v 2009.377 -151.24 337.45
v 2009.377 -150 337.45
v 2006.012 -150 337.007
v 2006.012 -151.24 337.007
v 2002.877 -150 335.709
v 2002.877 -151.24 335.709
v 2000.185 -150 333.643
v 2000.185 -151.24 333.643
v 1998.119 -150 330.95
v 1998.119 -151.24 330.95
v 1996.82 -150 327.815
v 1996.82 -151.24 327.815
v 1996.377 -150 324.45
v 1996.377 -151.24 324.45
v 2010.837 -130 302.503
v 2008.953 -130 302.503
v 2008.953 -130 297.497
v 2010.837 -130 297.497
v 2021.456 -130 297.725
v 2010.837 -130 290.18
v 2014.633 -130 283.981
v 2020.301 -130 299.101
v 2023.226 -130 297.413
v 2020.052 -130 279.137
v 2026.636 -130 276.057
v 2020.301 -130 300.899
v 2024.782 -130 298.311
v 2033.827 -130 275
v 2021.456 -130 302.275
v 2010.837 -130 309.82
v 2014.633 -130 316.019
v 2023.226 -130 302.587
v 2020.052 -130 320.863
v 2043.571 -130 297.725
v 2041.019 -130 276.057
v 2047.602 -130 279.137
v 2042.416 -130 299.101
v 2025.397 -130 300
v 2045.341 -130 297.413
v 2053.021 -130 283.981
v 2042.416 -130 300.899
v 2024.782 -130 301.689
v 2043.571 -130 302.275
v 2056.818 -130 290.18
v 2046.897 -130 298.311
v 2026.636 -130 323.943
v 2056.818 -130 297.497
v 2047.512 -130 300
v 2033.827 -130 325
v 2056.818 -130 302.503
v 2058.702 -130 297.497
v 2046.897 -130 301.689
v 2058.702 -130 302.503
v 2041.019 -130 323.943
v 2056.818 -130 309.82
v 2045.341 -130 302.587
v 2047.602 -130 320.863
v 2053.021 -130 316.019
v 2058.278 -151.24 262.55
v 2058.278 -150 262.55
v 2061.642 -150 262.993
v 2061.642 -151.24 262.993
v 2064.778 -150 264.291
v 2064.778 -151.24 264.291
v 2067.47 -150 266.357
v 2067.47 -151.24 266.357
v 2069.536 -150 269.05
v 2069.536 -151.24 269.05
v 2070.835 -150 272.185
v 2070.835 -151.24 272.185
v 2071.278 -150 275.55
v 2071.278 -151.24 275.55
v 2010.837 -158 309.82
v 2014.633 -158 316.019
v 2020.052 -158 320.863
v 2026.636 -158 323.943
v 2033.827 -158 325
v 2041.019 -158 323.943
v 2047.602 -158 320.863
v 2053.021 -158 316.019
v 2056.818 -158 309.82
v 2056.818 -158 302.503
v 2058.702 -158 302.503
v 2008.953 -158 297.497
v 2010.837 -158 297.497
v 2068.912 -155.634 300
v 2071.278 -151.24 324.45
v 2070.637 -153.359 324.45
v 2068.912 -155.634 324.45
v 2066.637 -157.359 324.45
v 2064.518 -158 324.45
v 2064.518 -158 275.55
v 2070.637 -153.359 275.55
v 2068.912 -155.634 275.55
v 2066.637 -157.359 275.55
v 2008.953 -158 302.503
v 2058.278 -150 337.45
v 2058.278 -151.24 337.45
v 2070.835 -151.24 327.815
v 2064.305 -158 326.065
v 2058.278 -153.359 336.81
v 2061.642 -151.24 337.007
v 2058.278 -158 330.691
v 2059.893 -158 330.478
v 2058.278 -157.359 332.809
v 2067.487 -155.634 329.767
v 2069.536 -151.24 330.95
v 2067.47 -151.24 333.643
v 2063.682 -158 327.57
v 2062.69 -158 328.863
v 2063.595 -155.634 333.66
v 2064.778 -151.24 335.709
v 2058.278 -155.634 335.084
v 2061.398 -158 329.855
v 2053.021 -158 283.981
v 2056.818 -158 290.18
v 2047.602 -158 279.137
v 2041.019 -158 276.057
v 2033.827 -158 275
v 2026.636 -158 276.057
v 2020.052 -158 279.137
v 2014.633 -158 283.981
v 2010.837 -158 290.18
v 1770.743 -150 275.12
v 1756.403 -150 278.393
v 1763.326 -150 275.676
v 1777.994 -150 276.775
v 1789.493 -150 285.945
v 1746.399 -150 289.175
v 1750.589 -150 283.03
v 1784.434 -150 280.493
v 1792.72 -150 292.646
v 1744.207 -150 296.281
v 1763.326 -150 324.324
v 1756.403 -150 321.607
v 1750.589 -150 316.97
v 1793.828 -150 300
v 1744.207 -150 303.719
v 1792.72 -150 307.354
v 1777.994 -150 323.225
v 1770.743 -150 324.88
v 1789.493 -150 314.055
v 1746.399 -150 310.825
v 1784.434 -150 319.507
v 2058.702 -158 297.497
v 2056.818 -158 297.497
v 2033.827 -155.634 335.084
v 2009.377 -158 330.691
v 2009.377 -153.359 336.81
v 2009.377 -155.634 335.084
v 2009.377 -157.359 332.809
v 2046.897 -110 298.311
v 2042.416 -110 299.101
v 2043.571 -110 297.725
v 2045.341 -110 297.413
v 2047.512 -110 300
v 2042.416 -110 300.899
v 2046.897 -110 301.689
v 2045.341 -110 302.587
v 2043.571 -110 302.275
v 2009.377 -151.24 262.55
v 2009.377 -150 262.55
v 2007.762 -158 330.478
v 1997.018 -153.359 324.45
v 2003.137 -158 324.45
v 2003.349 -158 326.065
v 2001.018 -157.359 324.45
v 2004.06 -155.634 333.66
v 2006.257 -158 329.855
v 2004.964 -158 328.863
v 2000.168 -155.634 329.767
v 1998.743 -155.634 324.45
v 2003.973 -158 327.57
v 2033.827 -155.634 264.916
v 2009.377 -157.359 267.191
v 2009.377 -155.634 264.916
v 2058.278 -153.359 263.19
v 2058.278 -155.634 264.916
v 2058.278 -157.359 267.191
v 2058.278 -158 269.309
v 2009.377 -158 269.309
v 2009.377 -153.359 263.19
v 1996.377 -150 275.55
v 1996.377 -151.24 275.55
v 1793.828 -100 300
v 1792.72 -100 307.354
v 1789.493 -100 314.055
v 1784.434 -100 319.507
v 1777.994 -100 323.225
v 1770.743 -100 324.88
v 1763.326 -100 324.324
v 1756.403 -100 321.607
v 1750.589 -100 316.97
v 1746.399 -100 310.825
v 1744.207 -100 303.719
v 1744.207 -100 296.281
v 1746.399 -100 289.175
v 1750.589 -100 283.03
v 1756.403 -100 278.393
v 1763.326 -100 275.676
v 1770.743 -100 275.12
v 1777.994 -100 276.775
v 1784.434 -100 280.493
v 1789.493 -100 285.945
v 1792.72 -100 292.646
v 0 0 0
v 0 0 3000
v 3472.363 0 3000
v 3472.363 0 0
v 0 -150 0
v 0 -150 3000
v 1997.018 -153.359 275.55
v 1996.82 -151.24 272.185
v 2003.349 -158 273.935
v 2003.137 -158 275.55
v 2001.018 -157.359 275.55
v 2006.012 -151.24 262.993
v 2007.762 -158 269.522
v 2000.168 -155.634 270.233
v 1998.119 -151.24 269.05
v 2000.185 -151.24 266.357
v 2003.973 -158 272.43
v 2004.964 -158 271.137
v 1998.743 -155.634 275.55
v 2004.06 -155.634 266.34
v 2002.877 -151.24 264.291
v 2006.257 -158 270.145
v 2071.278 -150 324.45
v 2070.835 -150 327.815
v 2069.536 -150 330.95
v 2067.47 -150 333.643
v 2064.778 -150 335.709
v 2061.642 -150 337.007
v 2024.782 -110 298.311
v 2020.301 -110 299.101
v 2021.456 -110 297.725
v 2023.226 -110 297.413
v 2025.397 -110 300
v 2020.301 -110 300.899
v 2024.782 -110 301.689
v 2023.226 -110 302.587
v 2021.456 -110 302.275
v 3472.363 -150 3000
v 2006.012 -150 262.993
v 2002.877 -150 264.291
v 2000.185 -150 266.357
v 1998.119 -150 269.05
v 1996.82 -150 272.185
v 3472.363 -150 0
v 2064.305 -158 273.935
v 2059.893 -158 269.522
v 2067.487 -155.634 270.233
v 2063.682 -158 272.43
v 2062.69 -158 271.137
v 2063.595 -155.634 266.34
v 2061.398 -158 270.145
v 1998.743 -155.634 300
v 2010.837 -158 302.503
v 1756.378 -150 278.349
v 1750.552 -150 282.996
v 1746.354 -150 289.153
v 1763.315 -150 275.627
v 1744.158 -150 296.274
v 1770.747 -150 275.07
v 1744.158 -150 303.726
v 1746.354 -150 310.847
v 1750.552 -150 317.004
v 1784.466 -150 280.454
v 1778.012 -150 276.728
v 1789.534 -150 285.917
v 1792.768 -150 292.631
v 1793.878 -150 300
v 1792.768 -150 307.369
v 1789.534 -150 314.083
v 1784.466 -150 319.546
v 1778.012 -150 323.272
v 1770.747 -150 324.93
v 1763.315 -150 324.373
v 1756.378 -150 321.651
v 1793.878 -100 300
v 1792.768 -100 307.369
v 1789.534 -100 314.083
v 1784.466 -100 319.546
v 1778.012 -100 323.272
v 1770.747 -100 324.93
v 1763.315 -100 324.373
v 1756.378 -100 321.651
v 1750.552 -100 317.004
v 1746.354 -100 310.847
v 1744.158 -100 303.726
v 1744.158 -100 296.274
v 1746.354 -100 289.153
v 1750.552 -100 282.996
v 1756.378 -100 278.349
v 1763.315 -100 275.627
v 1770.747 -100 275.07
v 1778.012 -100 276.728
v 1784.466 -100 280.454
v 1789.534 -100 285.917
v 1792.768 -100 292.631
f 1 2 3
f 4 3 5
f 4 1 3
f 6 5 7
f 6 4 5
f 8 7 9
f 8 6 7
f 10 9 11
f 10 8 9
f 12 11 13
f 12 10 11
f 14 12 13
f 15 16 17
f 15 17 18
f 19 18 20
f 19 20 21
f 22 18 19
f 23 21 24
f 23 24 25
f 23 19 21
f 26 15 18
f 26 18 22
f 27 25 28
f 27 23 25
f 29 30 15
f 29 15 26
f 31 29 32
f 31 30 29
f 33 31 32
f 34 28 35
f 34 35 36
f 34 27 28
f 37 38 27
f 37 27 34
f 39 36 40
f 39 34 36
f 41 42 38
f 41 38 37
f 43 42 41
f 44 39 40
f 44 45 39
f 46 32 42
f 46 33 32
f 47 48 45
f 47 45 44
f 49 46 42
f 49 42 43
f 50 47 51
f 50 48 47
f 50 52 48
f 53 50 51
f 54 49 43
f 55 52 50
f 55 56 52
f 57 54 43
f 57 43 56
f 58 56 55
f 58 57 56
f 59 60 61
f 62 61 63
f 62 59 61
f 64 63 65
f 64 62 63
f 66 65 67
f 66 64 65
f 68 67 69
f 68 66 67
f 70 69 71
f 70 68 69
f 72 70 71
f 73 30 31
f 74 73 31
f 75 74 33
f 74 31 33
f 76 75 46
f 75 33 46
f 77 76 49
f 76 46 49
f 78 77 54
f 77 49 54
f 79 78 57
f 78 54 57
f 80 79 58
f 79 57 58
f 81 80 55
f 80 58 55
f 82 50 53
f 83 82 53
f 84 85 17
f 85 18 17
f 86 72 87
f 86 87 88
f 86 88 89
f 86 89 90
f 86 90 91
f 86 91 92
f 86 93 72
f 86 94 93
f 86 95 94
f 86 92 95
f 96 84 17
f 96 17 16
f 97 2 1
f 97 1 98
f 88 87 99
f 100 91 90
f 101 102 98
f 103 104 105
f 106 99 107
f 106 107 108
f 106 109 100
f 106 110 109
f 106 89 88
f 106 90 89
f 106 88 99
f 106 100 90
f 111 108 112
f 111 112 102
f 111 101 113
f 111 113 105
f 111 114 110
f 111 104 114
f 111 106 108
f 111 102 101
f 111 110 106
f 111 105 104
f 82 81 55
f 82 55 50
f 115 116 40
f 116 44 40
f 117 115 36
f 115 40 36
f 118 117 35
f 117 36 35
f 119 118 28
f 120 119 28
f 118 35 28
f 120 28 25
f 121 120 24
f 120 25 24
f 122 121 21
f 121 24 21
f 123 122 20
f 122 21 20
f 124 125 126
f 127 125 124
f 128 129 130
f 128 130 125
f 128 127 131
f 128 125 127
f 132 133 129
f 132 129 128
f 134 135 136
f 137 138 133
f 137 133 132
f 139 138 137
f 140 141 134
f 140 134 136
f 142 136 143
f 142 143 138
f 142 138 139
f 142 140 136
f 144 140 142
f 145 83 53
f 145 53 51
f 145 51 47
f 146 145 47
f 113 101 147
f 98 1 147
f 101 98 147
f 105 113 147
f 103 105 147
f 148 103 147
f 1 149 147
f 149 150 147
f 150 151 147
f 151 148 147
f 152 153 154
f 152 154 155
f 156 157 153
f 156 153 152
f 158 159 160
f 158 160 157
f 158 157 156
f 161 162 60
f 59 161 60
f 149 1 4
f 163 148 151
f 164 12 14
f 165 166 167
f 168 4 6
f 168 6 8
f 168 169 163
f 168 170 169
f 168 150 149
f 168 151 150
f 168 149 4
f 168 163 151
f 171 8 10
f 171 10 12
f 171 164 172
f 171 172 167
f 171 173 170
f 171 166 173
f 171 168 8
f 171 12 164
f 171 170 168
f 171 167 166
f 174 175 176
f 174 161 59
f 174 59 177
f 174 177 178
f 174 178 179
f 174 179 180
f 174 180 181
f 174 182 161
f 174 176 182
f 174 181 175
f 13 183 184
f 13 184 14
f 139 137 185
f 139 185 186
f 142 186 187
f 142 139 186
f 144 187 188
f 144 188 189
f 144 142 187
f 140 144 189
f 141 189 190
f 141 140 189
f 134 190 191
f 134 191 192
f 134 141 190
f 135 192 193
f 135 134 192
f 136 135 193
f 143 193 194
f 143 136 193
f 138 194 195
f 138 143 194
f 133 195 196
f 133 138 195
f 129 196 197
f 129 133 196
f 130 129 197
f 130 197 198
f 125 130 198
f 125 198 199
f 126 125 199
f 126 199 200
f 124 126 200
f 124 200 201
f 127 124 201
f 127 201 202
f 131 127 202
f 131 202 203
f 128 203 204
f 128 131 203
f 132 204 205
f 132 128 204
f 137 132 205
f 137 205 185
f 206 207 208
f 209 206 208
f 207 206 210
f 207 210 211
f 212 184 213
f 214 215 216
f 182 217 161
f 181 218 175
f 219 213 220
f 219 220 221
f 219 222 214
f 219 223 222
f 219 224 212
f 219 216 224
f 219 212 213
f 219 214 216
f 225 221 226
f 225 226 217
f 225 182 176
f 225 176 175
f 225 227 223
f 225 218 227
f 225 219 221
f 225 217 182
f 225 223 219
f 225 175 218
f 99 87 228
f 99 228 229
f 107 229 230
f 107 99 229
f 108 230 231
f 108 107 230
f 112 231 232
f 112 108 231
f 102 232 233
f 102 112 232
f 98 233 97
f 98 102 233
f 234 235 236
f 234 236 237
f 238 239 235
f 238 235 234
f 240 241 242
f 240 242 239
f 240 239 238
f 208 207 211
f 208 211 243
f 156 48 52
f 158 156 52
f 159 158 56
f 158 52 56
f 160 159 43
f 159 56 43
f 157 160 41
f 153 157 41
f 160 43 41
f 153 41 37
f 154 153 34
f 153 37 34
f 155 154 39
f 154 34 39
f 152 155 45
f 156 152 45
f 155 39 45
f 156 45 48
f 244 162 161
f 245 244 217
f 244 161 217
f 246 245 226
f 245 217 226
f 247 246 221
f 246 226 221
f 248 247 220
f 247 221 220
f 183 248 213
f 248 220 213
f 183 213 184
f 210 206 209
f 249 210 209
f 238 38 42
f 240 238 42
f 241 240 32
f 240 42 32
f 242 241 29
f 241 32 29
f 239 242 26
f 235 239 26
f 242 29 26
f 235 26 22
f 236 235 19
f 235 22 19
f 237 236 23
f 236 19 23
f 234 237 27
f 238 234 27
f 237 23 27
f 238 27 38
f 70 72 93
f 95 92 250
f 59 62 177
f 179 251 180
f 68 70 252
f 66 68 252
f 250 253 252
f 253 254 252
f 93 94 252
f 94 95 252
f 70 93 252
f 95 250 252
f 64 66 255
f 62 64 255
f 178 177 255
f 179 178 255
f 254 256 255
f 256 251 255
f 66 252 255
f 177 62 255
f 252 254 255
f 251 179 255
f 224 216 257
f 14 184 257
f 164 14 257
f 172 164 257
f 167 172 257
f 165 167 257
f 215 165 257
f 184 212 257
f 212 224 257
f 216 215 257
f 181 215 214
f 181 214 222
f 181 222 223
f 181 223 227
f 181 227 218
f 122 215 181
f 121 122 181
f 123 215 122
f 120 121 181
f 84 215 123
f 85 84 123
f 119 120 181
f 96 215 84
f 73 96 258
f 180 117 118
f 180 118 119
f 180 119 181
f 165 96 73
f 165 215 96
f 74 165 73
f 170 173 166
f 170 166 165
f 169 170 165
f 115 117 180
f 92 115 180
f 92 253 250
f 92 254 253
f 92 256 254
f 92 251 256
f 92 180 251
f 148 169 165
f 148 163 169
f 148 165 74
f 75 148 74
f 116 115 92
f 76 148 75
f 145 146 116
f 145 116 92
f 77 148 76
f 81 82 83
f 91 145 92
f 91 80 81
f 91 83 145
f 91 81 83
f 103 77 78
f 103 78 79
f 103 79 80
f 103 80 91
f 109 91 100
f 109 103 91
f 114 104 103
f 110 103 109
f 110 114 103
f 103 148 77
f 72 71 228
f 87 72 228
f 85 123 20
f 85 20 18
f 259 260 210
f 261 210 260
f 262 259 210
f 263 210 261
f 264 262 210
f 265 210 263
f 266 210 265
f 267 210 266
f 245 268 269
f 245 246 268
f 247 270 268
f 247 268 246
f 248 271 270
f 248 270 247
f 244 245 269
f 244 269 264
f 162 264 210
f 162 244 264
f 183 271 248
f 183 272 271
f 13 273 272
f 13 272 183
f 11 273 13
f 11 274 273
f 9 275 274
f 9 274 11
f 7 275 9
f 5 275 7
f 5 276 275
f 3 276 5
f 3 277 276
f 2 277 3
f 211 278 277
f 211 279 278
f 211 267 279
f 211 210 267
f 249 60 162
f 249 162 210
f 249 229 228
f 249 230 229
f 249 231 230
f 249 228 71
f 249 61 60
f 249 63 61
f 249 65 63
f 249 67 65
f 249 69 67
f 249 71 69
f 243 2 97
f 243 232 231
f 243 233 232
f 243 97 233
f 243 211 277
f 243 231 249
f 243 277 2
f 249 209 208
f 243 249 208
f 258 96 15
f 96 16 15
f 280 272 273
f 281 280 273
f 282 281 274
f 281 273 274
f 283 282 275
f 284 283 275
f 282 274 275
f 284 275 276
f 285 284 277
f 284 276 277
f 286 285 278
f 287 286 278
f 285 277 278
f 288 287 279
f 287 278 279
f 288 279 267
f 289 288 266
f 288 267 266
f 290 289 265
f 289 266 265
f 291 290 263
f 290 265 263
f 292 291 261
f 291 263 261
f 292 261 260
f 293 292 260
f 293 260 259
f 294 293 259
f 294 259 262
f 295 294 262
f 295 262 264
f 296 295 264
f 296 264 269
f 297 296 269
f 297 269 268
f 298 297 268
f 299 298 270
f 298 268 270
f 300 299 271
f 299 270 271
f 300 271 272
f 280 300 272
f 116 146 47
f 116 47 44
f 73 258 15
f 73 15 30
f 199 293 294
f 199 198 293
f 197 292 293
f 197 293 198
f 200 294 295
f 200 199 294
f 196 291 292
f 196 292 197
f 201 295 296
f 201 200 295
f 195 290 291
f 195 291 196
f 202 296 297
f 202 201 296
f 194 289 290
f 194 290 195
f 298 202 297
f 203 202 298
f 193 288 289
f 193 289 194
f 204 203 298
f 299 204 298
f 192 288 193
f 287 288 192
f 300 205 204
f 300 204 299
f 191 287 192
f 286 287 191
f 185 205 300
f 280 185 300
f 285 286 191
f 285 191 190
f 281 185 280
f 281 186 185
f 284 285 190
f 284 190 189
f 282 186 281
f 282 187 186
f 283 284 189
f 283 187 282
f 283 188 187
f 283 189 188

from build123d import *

# Parameters (mm, degrees)
F0_W         = 3472.3631921678
F0_H         = 3000
F1_DEPTH     = 150
F2_R         = 25
F2_R_2       = 24.95
F3_DEPTH     = 50
F4_W         = 74.9007655587
F4_H         = 74.9007655587
F5_DEPTH     = 8
F6_R         = 13
F7_T1_DEPTH  = 48.9007655587
F7_T3_DEPTH  = 48.9007655587
F7_T6_ANGLE  = 90
F7_T8_ANGLE  = 90
F7_T10_ANGLE = 90
F7_T12_ANGLE = 90
F4_R         = 2.6271162968
F8_DEPTH     = 20
F9_DEPTH     = 40


# Not quite as in the source:
# - a fillet or chamfer that OpenCascade refuses, or shapes differently, is made with other operations: its cross-section is extruded or revolved along the edge and cut away or added


with BuildPart() as f1:
    # F0 (on Front) → F1 (new body)
    with BuildSketch(Plane.XZ):
        with Locations((1736.1815960839, 1500)):
            Rectangle(F0_W, F0_H)
    extrude(amount=F1_DEPTH)

    # F2 (on face) → F3 (cut)
    with BuildSketch(Plane.XZ.offset(150)):
        with Locations((1768.8783407211, 300)):
            Circle(F2_R)
        with Locations((1768.8783407211, 300)):
            Circle(F2_R_2, mode=Mode.SUBTRACT)
    extrude(amount=-F3_DEPTH, mode=Mode.SUBTRACT)

    # F4 (on face) → F5 (join)
    with BuildSketch(Plane.XZ.offset(150)):
        with Locations((2033.8273048401, 300)):
            Rectangle(F4_W, F4_H)
        with BuildLine():
            ThreePointArc((2056.8177885488, 290.179732242), (2033.8273048401, 275), (2010.8368211313, 290.179732242))
            Line((2010.8368211313, 290.179732242), (2010.8368211313, 297.4973082542))
            Line((2010.8368211313, 297.4973082542), (2008.9528895902, 297.4973082542))
            Line((2008.9528895902, 297.4973082542), (2008.9528895902, 302.5026917458))
            Line((2008.9528895902, 302.5026917458), (2010.8368211313, 302.5026917458))
            Line((2010.8368211313, 302.5026917458), (2010.8368211313, 309.820267758))
            ThreePointArc((2010.8368211313, 309.820267758), (2020.0524490141, 320.8627262594), (2033.8273048401, 325))
            ThreePointArc((2033.8273048401, 325), (2047.602160666, 320.8627262594), (2056.8177885488, 309.820267758))
            Line((2056.8177885488, 309.820267758), (2056.8177885488, 302.5026917458))
            Line((2056.8177885488, 302.5026917458), (2058.70172009, 302.5026917458))
            Line((2058.70172009, 302.5026917458), (2058.70172009, 297.4973082542))
            Line((2058.70172009, 297.4973082542), (2056.8177885488, 297.4973082542))
            Line((2056.8177885488, 297.4973082542), (2056.8177885488, 290.179732242))
        make_face(mode=Mode.SUBTRACT)
    extrude(amount=F5_DEPTH)

    # F6
    f6_edges = [f1.edges().sort_by_distance(p)[0] for p in [
        (1996.376922, -154, 337.450383),
        (1996.376922, -154, 262.549617),
        (2071.277688, -154, 262.549617),
        (2071.277688, -154, 337.450383),
    ]]
    fillet(f6_edges, radius=F6_R)

    # F7: fillet of radius 6.7597979746 on 8 edges, made by hand

    # F7_s2 → F7_t1 (cut)
    with BuildSketch(Plane.YZ.offset(2009.3769220608)):
        with BuildLine():
            add(Edge.make_bspline(
                [(-151.2402020254, 337.4503827793), (-158, 337.4503827793), (-158, 330.6905848047)],
                knots=[0, 0, 0, 1, 1, 1], degree=2, weights=[1, 0.4285714286, 1]))
            Line((-158, 330.6905848047), (-158, 337.4503827793))
            Line((-158, 337.4503827793), (-151.2402020254, 337.4503827793))
        make_face()
        with BuildLine():
            add(Edge.make_bspline(
                [(-151.2402020254, 262.5496172207), (-158, 262.5496172207), (-158, 269.3094151953)],
                knots=[0, 0, 0, 1, 1, 1], degree=2, weights=[1, 0.4285714286, 1]))
            Line((-158, 269.3094151953), (-158, 262.5496172207))
            Line((-158, 262.5496172207), (-151.2402020254, 262.5496172207))
        make_face()
    extrude(amount=F7_T1_DEPTH, mode=Mode.SUBTRACT)

    # F7_s4 → F7_t3 (cut)
    with BuildSketch(Plane.XY.offset(275.5496172207)):
        with BuildLine():
            add(Edge.make_bspline(
                [(2071.2776876194, -151.2402020254), (2071.2776876194, -158), (2064.5178896448, -158)],
                knots=[0, 0, 0, 1, 1, 1], degree=2, weights=[1, 0.4285714286, 1]))
            Line((2064.5178896448, -158), (2071.2776876194, -158))
            Line((2071.2776876194, -158), (2071.2776876194, -151.2402020254))
        make_face()
        with BuildLine():
            add(Edge.make_bspline(
                [(1996.3769220608, -151.2402020254), (1996.3769220608, -158), (2003.1367200354, -158)],
                knots=[0, 0, 0, 1, 1, 1], degree=2, weights=[1, 0.4285714286, 1]))
            Line((2003.1367200354, -158), (1996.3769220608, -158))
            Line((1996.3769220608, -158), (1996.3769220608, -151.2402020254))
        make_face()
    extrude(amount=F7_T3_DEPTH, mode=Mode.SUBTRACT)

    # F7_s5 → F7_t6 (revolve, cut)
    with BuildSketch(Plane.YZ.offset(2009.3769220608)):
        with BuildLine():
            add(Edge.make_bspline(
                [(-151.2402020254, 337.4503827793), (-158, 337.4503827793), (-158, 330.6905848047)],
                knots=[0, 0, 0, 1, 1, 1], degree=2, weights=[1, 0.4285714286, 1]))
            Line((-158, 330.6905848047), (-158, 337.4503827793))
            Line((-158, 337.4503827793), (-151.2402020254, 337.4503827793))
        make_face()
    revolve(axis=Axis((2009.3769220608, -158, 324.4503827793), (0, -1, 0)), revolution_arc=F7_T6_ANGLE, mode=Mode.SUBTRACT)

    # F7_s7 → F7_t8 (revolve, cut)
    with BuildSketch(Plane.XY.offset(324.4503827793)):
        with BuildLine():
            add(Edge.make_bspline(
                [(2071.2776876194, -151.2402020254), (2071.2776876194, -158), (2064.5178896448, -158)],
                knots=[0, 0, 0, 1, 1, 1], degree=2, weights=[1, 0.4285714286, 1]))
            Line((2064.5178896448, -158), (2071.2776876194, -158))
            Line((2071.2776876194, -158), (2071.2776876194, -151.2402020254))
        make_face()
    revolve(axis=Axis((2058.2776876194, -158, 324.4503827793), (0, -1, 0)), revolution_arc=F7_T8_ANGLE, mode=Mode.SUBTRACT)

    # F7_s9 → F7_t10 (revolve, cut)
    with BuildSketch(Plane.XY.offset(275.5496172207)):
        with BuildLine():
            add(Edge.make_bspline(
                [(2071.2776876194, -151.2402020254), (2071.2776876194, -158), (2064.5178896448, -158)],
                knots=[0, 0, 0, 1, 1, 1], degree=2, weights=[1, 0.4285714286, 1]))
            Line((2064.5178896448, -158), (2071.2776876194, -158))
            Line((2071.2776876194, -158), (2071.2776876194, -151.2402020254))
        make_face()
    revolve(axis=Axis((2058.2776876194, -158, 275.5496172207), (0, 1, 0)), revolution_arc=F7_T10_ANGLE, mode=Mode.SUBTRACT)

    # F7_s11 → F7_t12 (revolve, cut)
    with BuildSketch(Plane.XY.offset(275.5496172207)):
        with BuildLine():
            add(Edge.make_bspline(
                [(1996.3769220608, -151.2402020254), (1996.3769220608, -158), (2003.1367200354, -158)],
                knots=[0, 0, 0, 1, 1, 1], degree=2, weights=[1, 0.4285714286, 1]))
            Line((2003.1367200354, -158), (1996.3769220608, -158))
            Line((1996.3769220608, -158), (1996.3769220608, -151.2402020254))
        make_face()
    revolve(axis=Axis((2009.3769220608, -158, 275.5496172207), (0, -1, 0)), revolution_arc=F7_T12_ANGLE, mode=Mode.SUBTRACT)

    # F4 (on face) → F8 (cut)
    with BuildSketch(Plane.XZ.offset(150)):
        with BuildLine():
            Line((2010.8368211313, 297.4973082542), (2010.8368211313, 290.179732242))
            ThreePointArc((2010.8368211313, 290.179732242), (2033.8273048401, 275), (2056.8177885488, 290.179732242))
            Line((2056.8177885488, 290.179732242), (2056.8177885488, 297.4973082542))
            Line((2056.8177885488, 297.4973082542), (2058.70172009, 297.4973082542))
            Line((2058.70172009, 297.4973082542), (2058.70172009, 302.5026917458))
            Line((2058.70172009, 302.5026917458), (2056.8177885488, 302.5026917458))
            Line((2056.8177885488, 302.5026917458), (2056.8177885488, 309.820267758))
            ThreePointArc((2056.8177885488, 309.820267758), (2047.602160666, 320.8627262594), (2033.8273048401, 325))
            ThreePointArc((2033.8273048401, 325), (2020.0524490141, 320.8627262594), (2010.8368211313, 309.820267758))
            Line((2010.8368211313, 309.820267758), (2010.8368211313, 302.5026917458))
            Line((2010.8368211313, 302.5026917458), (2008.9528895902, 302.5026917458))
            Line((2008.9528895902, 302.5026917458), (2008.9528895902, 297.4973082542))
            Line((2008.9528895902, 297.4973082542), (2010.8368211313, 297.4973082542))
        make_face()
        with Locations((2022.7699279785, 300)):
            Circle(F4_R, mode=Mode.SUBTRACT)
        with Locations((2044.8846817017, 300)):
            Circle(F4_R, mode=Mode.SUBTRACT)
    extrude(amount=-F8_DEPTH, mode=Mode.SUBTRACT)

    # F9 (cut): faces of the model
    f9_faces = [f1.faces().sort_by_distance(p)[0] for p in [
        (2022.7699279785, -150, 300),
        (2044.8846817017, -150, 300),
    ]]
    extrude(f9_faces, amount=-F9_DEPTH, mode=Mode.SUBTRACT)


solid = f1.part
